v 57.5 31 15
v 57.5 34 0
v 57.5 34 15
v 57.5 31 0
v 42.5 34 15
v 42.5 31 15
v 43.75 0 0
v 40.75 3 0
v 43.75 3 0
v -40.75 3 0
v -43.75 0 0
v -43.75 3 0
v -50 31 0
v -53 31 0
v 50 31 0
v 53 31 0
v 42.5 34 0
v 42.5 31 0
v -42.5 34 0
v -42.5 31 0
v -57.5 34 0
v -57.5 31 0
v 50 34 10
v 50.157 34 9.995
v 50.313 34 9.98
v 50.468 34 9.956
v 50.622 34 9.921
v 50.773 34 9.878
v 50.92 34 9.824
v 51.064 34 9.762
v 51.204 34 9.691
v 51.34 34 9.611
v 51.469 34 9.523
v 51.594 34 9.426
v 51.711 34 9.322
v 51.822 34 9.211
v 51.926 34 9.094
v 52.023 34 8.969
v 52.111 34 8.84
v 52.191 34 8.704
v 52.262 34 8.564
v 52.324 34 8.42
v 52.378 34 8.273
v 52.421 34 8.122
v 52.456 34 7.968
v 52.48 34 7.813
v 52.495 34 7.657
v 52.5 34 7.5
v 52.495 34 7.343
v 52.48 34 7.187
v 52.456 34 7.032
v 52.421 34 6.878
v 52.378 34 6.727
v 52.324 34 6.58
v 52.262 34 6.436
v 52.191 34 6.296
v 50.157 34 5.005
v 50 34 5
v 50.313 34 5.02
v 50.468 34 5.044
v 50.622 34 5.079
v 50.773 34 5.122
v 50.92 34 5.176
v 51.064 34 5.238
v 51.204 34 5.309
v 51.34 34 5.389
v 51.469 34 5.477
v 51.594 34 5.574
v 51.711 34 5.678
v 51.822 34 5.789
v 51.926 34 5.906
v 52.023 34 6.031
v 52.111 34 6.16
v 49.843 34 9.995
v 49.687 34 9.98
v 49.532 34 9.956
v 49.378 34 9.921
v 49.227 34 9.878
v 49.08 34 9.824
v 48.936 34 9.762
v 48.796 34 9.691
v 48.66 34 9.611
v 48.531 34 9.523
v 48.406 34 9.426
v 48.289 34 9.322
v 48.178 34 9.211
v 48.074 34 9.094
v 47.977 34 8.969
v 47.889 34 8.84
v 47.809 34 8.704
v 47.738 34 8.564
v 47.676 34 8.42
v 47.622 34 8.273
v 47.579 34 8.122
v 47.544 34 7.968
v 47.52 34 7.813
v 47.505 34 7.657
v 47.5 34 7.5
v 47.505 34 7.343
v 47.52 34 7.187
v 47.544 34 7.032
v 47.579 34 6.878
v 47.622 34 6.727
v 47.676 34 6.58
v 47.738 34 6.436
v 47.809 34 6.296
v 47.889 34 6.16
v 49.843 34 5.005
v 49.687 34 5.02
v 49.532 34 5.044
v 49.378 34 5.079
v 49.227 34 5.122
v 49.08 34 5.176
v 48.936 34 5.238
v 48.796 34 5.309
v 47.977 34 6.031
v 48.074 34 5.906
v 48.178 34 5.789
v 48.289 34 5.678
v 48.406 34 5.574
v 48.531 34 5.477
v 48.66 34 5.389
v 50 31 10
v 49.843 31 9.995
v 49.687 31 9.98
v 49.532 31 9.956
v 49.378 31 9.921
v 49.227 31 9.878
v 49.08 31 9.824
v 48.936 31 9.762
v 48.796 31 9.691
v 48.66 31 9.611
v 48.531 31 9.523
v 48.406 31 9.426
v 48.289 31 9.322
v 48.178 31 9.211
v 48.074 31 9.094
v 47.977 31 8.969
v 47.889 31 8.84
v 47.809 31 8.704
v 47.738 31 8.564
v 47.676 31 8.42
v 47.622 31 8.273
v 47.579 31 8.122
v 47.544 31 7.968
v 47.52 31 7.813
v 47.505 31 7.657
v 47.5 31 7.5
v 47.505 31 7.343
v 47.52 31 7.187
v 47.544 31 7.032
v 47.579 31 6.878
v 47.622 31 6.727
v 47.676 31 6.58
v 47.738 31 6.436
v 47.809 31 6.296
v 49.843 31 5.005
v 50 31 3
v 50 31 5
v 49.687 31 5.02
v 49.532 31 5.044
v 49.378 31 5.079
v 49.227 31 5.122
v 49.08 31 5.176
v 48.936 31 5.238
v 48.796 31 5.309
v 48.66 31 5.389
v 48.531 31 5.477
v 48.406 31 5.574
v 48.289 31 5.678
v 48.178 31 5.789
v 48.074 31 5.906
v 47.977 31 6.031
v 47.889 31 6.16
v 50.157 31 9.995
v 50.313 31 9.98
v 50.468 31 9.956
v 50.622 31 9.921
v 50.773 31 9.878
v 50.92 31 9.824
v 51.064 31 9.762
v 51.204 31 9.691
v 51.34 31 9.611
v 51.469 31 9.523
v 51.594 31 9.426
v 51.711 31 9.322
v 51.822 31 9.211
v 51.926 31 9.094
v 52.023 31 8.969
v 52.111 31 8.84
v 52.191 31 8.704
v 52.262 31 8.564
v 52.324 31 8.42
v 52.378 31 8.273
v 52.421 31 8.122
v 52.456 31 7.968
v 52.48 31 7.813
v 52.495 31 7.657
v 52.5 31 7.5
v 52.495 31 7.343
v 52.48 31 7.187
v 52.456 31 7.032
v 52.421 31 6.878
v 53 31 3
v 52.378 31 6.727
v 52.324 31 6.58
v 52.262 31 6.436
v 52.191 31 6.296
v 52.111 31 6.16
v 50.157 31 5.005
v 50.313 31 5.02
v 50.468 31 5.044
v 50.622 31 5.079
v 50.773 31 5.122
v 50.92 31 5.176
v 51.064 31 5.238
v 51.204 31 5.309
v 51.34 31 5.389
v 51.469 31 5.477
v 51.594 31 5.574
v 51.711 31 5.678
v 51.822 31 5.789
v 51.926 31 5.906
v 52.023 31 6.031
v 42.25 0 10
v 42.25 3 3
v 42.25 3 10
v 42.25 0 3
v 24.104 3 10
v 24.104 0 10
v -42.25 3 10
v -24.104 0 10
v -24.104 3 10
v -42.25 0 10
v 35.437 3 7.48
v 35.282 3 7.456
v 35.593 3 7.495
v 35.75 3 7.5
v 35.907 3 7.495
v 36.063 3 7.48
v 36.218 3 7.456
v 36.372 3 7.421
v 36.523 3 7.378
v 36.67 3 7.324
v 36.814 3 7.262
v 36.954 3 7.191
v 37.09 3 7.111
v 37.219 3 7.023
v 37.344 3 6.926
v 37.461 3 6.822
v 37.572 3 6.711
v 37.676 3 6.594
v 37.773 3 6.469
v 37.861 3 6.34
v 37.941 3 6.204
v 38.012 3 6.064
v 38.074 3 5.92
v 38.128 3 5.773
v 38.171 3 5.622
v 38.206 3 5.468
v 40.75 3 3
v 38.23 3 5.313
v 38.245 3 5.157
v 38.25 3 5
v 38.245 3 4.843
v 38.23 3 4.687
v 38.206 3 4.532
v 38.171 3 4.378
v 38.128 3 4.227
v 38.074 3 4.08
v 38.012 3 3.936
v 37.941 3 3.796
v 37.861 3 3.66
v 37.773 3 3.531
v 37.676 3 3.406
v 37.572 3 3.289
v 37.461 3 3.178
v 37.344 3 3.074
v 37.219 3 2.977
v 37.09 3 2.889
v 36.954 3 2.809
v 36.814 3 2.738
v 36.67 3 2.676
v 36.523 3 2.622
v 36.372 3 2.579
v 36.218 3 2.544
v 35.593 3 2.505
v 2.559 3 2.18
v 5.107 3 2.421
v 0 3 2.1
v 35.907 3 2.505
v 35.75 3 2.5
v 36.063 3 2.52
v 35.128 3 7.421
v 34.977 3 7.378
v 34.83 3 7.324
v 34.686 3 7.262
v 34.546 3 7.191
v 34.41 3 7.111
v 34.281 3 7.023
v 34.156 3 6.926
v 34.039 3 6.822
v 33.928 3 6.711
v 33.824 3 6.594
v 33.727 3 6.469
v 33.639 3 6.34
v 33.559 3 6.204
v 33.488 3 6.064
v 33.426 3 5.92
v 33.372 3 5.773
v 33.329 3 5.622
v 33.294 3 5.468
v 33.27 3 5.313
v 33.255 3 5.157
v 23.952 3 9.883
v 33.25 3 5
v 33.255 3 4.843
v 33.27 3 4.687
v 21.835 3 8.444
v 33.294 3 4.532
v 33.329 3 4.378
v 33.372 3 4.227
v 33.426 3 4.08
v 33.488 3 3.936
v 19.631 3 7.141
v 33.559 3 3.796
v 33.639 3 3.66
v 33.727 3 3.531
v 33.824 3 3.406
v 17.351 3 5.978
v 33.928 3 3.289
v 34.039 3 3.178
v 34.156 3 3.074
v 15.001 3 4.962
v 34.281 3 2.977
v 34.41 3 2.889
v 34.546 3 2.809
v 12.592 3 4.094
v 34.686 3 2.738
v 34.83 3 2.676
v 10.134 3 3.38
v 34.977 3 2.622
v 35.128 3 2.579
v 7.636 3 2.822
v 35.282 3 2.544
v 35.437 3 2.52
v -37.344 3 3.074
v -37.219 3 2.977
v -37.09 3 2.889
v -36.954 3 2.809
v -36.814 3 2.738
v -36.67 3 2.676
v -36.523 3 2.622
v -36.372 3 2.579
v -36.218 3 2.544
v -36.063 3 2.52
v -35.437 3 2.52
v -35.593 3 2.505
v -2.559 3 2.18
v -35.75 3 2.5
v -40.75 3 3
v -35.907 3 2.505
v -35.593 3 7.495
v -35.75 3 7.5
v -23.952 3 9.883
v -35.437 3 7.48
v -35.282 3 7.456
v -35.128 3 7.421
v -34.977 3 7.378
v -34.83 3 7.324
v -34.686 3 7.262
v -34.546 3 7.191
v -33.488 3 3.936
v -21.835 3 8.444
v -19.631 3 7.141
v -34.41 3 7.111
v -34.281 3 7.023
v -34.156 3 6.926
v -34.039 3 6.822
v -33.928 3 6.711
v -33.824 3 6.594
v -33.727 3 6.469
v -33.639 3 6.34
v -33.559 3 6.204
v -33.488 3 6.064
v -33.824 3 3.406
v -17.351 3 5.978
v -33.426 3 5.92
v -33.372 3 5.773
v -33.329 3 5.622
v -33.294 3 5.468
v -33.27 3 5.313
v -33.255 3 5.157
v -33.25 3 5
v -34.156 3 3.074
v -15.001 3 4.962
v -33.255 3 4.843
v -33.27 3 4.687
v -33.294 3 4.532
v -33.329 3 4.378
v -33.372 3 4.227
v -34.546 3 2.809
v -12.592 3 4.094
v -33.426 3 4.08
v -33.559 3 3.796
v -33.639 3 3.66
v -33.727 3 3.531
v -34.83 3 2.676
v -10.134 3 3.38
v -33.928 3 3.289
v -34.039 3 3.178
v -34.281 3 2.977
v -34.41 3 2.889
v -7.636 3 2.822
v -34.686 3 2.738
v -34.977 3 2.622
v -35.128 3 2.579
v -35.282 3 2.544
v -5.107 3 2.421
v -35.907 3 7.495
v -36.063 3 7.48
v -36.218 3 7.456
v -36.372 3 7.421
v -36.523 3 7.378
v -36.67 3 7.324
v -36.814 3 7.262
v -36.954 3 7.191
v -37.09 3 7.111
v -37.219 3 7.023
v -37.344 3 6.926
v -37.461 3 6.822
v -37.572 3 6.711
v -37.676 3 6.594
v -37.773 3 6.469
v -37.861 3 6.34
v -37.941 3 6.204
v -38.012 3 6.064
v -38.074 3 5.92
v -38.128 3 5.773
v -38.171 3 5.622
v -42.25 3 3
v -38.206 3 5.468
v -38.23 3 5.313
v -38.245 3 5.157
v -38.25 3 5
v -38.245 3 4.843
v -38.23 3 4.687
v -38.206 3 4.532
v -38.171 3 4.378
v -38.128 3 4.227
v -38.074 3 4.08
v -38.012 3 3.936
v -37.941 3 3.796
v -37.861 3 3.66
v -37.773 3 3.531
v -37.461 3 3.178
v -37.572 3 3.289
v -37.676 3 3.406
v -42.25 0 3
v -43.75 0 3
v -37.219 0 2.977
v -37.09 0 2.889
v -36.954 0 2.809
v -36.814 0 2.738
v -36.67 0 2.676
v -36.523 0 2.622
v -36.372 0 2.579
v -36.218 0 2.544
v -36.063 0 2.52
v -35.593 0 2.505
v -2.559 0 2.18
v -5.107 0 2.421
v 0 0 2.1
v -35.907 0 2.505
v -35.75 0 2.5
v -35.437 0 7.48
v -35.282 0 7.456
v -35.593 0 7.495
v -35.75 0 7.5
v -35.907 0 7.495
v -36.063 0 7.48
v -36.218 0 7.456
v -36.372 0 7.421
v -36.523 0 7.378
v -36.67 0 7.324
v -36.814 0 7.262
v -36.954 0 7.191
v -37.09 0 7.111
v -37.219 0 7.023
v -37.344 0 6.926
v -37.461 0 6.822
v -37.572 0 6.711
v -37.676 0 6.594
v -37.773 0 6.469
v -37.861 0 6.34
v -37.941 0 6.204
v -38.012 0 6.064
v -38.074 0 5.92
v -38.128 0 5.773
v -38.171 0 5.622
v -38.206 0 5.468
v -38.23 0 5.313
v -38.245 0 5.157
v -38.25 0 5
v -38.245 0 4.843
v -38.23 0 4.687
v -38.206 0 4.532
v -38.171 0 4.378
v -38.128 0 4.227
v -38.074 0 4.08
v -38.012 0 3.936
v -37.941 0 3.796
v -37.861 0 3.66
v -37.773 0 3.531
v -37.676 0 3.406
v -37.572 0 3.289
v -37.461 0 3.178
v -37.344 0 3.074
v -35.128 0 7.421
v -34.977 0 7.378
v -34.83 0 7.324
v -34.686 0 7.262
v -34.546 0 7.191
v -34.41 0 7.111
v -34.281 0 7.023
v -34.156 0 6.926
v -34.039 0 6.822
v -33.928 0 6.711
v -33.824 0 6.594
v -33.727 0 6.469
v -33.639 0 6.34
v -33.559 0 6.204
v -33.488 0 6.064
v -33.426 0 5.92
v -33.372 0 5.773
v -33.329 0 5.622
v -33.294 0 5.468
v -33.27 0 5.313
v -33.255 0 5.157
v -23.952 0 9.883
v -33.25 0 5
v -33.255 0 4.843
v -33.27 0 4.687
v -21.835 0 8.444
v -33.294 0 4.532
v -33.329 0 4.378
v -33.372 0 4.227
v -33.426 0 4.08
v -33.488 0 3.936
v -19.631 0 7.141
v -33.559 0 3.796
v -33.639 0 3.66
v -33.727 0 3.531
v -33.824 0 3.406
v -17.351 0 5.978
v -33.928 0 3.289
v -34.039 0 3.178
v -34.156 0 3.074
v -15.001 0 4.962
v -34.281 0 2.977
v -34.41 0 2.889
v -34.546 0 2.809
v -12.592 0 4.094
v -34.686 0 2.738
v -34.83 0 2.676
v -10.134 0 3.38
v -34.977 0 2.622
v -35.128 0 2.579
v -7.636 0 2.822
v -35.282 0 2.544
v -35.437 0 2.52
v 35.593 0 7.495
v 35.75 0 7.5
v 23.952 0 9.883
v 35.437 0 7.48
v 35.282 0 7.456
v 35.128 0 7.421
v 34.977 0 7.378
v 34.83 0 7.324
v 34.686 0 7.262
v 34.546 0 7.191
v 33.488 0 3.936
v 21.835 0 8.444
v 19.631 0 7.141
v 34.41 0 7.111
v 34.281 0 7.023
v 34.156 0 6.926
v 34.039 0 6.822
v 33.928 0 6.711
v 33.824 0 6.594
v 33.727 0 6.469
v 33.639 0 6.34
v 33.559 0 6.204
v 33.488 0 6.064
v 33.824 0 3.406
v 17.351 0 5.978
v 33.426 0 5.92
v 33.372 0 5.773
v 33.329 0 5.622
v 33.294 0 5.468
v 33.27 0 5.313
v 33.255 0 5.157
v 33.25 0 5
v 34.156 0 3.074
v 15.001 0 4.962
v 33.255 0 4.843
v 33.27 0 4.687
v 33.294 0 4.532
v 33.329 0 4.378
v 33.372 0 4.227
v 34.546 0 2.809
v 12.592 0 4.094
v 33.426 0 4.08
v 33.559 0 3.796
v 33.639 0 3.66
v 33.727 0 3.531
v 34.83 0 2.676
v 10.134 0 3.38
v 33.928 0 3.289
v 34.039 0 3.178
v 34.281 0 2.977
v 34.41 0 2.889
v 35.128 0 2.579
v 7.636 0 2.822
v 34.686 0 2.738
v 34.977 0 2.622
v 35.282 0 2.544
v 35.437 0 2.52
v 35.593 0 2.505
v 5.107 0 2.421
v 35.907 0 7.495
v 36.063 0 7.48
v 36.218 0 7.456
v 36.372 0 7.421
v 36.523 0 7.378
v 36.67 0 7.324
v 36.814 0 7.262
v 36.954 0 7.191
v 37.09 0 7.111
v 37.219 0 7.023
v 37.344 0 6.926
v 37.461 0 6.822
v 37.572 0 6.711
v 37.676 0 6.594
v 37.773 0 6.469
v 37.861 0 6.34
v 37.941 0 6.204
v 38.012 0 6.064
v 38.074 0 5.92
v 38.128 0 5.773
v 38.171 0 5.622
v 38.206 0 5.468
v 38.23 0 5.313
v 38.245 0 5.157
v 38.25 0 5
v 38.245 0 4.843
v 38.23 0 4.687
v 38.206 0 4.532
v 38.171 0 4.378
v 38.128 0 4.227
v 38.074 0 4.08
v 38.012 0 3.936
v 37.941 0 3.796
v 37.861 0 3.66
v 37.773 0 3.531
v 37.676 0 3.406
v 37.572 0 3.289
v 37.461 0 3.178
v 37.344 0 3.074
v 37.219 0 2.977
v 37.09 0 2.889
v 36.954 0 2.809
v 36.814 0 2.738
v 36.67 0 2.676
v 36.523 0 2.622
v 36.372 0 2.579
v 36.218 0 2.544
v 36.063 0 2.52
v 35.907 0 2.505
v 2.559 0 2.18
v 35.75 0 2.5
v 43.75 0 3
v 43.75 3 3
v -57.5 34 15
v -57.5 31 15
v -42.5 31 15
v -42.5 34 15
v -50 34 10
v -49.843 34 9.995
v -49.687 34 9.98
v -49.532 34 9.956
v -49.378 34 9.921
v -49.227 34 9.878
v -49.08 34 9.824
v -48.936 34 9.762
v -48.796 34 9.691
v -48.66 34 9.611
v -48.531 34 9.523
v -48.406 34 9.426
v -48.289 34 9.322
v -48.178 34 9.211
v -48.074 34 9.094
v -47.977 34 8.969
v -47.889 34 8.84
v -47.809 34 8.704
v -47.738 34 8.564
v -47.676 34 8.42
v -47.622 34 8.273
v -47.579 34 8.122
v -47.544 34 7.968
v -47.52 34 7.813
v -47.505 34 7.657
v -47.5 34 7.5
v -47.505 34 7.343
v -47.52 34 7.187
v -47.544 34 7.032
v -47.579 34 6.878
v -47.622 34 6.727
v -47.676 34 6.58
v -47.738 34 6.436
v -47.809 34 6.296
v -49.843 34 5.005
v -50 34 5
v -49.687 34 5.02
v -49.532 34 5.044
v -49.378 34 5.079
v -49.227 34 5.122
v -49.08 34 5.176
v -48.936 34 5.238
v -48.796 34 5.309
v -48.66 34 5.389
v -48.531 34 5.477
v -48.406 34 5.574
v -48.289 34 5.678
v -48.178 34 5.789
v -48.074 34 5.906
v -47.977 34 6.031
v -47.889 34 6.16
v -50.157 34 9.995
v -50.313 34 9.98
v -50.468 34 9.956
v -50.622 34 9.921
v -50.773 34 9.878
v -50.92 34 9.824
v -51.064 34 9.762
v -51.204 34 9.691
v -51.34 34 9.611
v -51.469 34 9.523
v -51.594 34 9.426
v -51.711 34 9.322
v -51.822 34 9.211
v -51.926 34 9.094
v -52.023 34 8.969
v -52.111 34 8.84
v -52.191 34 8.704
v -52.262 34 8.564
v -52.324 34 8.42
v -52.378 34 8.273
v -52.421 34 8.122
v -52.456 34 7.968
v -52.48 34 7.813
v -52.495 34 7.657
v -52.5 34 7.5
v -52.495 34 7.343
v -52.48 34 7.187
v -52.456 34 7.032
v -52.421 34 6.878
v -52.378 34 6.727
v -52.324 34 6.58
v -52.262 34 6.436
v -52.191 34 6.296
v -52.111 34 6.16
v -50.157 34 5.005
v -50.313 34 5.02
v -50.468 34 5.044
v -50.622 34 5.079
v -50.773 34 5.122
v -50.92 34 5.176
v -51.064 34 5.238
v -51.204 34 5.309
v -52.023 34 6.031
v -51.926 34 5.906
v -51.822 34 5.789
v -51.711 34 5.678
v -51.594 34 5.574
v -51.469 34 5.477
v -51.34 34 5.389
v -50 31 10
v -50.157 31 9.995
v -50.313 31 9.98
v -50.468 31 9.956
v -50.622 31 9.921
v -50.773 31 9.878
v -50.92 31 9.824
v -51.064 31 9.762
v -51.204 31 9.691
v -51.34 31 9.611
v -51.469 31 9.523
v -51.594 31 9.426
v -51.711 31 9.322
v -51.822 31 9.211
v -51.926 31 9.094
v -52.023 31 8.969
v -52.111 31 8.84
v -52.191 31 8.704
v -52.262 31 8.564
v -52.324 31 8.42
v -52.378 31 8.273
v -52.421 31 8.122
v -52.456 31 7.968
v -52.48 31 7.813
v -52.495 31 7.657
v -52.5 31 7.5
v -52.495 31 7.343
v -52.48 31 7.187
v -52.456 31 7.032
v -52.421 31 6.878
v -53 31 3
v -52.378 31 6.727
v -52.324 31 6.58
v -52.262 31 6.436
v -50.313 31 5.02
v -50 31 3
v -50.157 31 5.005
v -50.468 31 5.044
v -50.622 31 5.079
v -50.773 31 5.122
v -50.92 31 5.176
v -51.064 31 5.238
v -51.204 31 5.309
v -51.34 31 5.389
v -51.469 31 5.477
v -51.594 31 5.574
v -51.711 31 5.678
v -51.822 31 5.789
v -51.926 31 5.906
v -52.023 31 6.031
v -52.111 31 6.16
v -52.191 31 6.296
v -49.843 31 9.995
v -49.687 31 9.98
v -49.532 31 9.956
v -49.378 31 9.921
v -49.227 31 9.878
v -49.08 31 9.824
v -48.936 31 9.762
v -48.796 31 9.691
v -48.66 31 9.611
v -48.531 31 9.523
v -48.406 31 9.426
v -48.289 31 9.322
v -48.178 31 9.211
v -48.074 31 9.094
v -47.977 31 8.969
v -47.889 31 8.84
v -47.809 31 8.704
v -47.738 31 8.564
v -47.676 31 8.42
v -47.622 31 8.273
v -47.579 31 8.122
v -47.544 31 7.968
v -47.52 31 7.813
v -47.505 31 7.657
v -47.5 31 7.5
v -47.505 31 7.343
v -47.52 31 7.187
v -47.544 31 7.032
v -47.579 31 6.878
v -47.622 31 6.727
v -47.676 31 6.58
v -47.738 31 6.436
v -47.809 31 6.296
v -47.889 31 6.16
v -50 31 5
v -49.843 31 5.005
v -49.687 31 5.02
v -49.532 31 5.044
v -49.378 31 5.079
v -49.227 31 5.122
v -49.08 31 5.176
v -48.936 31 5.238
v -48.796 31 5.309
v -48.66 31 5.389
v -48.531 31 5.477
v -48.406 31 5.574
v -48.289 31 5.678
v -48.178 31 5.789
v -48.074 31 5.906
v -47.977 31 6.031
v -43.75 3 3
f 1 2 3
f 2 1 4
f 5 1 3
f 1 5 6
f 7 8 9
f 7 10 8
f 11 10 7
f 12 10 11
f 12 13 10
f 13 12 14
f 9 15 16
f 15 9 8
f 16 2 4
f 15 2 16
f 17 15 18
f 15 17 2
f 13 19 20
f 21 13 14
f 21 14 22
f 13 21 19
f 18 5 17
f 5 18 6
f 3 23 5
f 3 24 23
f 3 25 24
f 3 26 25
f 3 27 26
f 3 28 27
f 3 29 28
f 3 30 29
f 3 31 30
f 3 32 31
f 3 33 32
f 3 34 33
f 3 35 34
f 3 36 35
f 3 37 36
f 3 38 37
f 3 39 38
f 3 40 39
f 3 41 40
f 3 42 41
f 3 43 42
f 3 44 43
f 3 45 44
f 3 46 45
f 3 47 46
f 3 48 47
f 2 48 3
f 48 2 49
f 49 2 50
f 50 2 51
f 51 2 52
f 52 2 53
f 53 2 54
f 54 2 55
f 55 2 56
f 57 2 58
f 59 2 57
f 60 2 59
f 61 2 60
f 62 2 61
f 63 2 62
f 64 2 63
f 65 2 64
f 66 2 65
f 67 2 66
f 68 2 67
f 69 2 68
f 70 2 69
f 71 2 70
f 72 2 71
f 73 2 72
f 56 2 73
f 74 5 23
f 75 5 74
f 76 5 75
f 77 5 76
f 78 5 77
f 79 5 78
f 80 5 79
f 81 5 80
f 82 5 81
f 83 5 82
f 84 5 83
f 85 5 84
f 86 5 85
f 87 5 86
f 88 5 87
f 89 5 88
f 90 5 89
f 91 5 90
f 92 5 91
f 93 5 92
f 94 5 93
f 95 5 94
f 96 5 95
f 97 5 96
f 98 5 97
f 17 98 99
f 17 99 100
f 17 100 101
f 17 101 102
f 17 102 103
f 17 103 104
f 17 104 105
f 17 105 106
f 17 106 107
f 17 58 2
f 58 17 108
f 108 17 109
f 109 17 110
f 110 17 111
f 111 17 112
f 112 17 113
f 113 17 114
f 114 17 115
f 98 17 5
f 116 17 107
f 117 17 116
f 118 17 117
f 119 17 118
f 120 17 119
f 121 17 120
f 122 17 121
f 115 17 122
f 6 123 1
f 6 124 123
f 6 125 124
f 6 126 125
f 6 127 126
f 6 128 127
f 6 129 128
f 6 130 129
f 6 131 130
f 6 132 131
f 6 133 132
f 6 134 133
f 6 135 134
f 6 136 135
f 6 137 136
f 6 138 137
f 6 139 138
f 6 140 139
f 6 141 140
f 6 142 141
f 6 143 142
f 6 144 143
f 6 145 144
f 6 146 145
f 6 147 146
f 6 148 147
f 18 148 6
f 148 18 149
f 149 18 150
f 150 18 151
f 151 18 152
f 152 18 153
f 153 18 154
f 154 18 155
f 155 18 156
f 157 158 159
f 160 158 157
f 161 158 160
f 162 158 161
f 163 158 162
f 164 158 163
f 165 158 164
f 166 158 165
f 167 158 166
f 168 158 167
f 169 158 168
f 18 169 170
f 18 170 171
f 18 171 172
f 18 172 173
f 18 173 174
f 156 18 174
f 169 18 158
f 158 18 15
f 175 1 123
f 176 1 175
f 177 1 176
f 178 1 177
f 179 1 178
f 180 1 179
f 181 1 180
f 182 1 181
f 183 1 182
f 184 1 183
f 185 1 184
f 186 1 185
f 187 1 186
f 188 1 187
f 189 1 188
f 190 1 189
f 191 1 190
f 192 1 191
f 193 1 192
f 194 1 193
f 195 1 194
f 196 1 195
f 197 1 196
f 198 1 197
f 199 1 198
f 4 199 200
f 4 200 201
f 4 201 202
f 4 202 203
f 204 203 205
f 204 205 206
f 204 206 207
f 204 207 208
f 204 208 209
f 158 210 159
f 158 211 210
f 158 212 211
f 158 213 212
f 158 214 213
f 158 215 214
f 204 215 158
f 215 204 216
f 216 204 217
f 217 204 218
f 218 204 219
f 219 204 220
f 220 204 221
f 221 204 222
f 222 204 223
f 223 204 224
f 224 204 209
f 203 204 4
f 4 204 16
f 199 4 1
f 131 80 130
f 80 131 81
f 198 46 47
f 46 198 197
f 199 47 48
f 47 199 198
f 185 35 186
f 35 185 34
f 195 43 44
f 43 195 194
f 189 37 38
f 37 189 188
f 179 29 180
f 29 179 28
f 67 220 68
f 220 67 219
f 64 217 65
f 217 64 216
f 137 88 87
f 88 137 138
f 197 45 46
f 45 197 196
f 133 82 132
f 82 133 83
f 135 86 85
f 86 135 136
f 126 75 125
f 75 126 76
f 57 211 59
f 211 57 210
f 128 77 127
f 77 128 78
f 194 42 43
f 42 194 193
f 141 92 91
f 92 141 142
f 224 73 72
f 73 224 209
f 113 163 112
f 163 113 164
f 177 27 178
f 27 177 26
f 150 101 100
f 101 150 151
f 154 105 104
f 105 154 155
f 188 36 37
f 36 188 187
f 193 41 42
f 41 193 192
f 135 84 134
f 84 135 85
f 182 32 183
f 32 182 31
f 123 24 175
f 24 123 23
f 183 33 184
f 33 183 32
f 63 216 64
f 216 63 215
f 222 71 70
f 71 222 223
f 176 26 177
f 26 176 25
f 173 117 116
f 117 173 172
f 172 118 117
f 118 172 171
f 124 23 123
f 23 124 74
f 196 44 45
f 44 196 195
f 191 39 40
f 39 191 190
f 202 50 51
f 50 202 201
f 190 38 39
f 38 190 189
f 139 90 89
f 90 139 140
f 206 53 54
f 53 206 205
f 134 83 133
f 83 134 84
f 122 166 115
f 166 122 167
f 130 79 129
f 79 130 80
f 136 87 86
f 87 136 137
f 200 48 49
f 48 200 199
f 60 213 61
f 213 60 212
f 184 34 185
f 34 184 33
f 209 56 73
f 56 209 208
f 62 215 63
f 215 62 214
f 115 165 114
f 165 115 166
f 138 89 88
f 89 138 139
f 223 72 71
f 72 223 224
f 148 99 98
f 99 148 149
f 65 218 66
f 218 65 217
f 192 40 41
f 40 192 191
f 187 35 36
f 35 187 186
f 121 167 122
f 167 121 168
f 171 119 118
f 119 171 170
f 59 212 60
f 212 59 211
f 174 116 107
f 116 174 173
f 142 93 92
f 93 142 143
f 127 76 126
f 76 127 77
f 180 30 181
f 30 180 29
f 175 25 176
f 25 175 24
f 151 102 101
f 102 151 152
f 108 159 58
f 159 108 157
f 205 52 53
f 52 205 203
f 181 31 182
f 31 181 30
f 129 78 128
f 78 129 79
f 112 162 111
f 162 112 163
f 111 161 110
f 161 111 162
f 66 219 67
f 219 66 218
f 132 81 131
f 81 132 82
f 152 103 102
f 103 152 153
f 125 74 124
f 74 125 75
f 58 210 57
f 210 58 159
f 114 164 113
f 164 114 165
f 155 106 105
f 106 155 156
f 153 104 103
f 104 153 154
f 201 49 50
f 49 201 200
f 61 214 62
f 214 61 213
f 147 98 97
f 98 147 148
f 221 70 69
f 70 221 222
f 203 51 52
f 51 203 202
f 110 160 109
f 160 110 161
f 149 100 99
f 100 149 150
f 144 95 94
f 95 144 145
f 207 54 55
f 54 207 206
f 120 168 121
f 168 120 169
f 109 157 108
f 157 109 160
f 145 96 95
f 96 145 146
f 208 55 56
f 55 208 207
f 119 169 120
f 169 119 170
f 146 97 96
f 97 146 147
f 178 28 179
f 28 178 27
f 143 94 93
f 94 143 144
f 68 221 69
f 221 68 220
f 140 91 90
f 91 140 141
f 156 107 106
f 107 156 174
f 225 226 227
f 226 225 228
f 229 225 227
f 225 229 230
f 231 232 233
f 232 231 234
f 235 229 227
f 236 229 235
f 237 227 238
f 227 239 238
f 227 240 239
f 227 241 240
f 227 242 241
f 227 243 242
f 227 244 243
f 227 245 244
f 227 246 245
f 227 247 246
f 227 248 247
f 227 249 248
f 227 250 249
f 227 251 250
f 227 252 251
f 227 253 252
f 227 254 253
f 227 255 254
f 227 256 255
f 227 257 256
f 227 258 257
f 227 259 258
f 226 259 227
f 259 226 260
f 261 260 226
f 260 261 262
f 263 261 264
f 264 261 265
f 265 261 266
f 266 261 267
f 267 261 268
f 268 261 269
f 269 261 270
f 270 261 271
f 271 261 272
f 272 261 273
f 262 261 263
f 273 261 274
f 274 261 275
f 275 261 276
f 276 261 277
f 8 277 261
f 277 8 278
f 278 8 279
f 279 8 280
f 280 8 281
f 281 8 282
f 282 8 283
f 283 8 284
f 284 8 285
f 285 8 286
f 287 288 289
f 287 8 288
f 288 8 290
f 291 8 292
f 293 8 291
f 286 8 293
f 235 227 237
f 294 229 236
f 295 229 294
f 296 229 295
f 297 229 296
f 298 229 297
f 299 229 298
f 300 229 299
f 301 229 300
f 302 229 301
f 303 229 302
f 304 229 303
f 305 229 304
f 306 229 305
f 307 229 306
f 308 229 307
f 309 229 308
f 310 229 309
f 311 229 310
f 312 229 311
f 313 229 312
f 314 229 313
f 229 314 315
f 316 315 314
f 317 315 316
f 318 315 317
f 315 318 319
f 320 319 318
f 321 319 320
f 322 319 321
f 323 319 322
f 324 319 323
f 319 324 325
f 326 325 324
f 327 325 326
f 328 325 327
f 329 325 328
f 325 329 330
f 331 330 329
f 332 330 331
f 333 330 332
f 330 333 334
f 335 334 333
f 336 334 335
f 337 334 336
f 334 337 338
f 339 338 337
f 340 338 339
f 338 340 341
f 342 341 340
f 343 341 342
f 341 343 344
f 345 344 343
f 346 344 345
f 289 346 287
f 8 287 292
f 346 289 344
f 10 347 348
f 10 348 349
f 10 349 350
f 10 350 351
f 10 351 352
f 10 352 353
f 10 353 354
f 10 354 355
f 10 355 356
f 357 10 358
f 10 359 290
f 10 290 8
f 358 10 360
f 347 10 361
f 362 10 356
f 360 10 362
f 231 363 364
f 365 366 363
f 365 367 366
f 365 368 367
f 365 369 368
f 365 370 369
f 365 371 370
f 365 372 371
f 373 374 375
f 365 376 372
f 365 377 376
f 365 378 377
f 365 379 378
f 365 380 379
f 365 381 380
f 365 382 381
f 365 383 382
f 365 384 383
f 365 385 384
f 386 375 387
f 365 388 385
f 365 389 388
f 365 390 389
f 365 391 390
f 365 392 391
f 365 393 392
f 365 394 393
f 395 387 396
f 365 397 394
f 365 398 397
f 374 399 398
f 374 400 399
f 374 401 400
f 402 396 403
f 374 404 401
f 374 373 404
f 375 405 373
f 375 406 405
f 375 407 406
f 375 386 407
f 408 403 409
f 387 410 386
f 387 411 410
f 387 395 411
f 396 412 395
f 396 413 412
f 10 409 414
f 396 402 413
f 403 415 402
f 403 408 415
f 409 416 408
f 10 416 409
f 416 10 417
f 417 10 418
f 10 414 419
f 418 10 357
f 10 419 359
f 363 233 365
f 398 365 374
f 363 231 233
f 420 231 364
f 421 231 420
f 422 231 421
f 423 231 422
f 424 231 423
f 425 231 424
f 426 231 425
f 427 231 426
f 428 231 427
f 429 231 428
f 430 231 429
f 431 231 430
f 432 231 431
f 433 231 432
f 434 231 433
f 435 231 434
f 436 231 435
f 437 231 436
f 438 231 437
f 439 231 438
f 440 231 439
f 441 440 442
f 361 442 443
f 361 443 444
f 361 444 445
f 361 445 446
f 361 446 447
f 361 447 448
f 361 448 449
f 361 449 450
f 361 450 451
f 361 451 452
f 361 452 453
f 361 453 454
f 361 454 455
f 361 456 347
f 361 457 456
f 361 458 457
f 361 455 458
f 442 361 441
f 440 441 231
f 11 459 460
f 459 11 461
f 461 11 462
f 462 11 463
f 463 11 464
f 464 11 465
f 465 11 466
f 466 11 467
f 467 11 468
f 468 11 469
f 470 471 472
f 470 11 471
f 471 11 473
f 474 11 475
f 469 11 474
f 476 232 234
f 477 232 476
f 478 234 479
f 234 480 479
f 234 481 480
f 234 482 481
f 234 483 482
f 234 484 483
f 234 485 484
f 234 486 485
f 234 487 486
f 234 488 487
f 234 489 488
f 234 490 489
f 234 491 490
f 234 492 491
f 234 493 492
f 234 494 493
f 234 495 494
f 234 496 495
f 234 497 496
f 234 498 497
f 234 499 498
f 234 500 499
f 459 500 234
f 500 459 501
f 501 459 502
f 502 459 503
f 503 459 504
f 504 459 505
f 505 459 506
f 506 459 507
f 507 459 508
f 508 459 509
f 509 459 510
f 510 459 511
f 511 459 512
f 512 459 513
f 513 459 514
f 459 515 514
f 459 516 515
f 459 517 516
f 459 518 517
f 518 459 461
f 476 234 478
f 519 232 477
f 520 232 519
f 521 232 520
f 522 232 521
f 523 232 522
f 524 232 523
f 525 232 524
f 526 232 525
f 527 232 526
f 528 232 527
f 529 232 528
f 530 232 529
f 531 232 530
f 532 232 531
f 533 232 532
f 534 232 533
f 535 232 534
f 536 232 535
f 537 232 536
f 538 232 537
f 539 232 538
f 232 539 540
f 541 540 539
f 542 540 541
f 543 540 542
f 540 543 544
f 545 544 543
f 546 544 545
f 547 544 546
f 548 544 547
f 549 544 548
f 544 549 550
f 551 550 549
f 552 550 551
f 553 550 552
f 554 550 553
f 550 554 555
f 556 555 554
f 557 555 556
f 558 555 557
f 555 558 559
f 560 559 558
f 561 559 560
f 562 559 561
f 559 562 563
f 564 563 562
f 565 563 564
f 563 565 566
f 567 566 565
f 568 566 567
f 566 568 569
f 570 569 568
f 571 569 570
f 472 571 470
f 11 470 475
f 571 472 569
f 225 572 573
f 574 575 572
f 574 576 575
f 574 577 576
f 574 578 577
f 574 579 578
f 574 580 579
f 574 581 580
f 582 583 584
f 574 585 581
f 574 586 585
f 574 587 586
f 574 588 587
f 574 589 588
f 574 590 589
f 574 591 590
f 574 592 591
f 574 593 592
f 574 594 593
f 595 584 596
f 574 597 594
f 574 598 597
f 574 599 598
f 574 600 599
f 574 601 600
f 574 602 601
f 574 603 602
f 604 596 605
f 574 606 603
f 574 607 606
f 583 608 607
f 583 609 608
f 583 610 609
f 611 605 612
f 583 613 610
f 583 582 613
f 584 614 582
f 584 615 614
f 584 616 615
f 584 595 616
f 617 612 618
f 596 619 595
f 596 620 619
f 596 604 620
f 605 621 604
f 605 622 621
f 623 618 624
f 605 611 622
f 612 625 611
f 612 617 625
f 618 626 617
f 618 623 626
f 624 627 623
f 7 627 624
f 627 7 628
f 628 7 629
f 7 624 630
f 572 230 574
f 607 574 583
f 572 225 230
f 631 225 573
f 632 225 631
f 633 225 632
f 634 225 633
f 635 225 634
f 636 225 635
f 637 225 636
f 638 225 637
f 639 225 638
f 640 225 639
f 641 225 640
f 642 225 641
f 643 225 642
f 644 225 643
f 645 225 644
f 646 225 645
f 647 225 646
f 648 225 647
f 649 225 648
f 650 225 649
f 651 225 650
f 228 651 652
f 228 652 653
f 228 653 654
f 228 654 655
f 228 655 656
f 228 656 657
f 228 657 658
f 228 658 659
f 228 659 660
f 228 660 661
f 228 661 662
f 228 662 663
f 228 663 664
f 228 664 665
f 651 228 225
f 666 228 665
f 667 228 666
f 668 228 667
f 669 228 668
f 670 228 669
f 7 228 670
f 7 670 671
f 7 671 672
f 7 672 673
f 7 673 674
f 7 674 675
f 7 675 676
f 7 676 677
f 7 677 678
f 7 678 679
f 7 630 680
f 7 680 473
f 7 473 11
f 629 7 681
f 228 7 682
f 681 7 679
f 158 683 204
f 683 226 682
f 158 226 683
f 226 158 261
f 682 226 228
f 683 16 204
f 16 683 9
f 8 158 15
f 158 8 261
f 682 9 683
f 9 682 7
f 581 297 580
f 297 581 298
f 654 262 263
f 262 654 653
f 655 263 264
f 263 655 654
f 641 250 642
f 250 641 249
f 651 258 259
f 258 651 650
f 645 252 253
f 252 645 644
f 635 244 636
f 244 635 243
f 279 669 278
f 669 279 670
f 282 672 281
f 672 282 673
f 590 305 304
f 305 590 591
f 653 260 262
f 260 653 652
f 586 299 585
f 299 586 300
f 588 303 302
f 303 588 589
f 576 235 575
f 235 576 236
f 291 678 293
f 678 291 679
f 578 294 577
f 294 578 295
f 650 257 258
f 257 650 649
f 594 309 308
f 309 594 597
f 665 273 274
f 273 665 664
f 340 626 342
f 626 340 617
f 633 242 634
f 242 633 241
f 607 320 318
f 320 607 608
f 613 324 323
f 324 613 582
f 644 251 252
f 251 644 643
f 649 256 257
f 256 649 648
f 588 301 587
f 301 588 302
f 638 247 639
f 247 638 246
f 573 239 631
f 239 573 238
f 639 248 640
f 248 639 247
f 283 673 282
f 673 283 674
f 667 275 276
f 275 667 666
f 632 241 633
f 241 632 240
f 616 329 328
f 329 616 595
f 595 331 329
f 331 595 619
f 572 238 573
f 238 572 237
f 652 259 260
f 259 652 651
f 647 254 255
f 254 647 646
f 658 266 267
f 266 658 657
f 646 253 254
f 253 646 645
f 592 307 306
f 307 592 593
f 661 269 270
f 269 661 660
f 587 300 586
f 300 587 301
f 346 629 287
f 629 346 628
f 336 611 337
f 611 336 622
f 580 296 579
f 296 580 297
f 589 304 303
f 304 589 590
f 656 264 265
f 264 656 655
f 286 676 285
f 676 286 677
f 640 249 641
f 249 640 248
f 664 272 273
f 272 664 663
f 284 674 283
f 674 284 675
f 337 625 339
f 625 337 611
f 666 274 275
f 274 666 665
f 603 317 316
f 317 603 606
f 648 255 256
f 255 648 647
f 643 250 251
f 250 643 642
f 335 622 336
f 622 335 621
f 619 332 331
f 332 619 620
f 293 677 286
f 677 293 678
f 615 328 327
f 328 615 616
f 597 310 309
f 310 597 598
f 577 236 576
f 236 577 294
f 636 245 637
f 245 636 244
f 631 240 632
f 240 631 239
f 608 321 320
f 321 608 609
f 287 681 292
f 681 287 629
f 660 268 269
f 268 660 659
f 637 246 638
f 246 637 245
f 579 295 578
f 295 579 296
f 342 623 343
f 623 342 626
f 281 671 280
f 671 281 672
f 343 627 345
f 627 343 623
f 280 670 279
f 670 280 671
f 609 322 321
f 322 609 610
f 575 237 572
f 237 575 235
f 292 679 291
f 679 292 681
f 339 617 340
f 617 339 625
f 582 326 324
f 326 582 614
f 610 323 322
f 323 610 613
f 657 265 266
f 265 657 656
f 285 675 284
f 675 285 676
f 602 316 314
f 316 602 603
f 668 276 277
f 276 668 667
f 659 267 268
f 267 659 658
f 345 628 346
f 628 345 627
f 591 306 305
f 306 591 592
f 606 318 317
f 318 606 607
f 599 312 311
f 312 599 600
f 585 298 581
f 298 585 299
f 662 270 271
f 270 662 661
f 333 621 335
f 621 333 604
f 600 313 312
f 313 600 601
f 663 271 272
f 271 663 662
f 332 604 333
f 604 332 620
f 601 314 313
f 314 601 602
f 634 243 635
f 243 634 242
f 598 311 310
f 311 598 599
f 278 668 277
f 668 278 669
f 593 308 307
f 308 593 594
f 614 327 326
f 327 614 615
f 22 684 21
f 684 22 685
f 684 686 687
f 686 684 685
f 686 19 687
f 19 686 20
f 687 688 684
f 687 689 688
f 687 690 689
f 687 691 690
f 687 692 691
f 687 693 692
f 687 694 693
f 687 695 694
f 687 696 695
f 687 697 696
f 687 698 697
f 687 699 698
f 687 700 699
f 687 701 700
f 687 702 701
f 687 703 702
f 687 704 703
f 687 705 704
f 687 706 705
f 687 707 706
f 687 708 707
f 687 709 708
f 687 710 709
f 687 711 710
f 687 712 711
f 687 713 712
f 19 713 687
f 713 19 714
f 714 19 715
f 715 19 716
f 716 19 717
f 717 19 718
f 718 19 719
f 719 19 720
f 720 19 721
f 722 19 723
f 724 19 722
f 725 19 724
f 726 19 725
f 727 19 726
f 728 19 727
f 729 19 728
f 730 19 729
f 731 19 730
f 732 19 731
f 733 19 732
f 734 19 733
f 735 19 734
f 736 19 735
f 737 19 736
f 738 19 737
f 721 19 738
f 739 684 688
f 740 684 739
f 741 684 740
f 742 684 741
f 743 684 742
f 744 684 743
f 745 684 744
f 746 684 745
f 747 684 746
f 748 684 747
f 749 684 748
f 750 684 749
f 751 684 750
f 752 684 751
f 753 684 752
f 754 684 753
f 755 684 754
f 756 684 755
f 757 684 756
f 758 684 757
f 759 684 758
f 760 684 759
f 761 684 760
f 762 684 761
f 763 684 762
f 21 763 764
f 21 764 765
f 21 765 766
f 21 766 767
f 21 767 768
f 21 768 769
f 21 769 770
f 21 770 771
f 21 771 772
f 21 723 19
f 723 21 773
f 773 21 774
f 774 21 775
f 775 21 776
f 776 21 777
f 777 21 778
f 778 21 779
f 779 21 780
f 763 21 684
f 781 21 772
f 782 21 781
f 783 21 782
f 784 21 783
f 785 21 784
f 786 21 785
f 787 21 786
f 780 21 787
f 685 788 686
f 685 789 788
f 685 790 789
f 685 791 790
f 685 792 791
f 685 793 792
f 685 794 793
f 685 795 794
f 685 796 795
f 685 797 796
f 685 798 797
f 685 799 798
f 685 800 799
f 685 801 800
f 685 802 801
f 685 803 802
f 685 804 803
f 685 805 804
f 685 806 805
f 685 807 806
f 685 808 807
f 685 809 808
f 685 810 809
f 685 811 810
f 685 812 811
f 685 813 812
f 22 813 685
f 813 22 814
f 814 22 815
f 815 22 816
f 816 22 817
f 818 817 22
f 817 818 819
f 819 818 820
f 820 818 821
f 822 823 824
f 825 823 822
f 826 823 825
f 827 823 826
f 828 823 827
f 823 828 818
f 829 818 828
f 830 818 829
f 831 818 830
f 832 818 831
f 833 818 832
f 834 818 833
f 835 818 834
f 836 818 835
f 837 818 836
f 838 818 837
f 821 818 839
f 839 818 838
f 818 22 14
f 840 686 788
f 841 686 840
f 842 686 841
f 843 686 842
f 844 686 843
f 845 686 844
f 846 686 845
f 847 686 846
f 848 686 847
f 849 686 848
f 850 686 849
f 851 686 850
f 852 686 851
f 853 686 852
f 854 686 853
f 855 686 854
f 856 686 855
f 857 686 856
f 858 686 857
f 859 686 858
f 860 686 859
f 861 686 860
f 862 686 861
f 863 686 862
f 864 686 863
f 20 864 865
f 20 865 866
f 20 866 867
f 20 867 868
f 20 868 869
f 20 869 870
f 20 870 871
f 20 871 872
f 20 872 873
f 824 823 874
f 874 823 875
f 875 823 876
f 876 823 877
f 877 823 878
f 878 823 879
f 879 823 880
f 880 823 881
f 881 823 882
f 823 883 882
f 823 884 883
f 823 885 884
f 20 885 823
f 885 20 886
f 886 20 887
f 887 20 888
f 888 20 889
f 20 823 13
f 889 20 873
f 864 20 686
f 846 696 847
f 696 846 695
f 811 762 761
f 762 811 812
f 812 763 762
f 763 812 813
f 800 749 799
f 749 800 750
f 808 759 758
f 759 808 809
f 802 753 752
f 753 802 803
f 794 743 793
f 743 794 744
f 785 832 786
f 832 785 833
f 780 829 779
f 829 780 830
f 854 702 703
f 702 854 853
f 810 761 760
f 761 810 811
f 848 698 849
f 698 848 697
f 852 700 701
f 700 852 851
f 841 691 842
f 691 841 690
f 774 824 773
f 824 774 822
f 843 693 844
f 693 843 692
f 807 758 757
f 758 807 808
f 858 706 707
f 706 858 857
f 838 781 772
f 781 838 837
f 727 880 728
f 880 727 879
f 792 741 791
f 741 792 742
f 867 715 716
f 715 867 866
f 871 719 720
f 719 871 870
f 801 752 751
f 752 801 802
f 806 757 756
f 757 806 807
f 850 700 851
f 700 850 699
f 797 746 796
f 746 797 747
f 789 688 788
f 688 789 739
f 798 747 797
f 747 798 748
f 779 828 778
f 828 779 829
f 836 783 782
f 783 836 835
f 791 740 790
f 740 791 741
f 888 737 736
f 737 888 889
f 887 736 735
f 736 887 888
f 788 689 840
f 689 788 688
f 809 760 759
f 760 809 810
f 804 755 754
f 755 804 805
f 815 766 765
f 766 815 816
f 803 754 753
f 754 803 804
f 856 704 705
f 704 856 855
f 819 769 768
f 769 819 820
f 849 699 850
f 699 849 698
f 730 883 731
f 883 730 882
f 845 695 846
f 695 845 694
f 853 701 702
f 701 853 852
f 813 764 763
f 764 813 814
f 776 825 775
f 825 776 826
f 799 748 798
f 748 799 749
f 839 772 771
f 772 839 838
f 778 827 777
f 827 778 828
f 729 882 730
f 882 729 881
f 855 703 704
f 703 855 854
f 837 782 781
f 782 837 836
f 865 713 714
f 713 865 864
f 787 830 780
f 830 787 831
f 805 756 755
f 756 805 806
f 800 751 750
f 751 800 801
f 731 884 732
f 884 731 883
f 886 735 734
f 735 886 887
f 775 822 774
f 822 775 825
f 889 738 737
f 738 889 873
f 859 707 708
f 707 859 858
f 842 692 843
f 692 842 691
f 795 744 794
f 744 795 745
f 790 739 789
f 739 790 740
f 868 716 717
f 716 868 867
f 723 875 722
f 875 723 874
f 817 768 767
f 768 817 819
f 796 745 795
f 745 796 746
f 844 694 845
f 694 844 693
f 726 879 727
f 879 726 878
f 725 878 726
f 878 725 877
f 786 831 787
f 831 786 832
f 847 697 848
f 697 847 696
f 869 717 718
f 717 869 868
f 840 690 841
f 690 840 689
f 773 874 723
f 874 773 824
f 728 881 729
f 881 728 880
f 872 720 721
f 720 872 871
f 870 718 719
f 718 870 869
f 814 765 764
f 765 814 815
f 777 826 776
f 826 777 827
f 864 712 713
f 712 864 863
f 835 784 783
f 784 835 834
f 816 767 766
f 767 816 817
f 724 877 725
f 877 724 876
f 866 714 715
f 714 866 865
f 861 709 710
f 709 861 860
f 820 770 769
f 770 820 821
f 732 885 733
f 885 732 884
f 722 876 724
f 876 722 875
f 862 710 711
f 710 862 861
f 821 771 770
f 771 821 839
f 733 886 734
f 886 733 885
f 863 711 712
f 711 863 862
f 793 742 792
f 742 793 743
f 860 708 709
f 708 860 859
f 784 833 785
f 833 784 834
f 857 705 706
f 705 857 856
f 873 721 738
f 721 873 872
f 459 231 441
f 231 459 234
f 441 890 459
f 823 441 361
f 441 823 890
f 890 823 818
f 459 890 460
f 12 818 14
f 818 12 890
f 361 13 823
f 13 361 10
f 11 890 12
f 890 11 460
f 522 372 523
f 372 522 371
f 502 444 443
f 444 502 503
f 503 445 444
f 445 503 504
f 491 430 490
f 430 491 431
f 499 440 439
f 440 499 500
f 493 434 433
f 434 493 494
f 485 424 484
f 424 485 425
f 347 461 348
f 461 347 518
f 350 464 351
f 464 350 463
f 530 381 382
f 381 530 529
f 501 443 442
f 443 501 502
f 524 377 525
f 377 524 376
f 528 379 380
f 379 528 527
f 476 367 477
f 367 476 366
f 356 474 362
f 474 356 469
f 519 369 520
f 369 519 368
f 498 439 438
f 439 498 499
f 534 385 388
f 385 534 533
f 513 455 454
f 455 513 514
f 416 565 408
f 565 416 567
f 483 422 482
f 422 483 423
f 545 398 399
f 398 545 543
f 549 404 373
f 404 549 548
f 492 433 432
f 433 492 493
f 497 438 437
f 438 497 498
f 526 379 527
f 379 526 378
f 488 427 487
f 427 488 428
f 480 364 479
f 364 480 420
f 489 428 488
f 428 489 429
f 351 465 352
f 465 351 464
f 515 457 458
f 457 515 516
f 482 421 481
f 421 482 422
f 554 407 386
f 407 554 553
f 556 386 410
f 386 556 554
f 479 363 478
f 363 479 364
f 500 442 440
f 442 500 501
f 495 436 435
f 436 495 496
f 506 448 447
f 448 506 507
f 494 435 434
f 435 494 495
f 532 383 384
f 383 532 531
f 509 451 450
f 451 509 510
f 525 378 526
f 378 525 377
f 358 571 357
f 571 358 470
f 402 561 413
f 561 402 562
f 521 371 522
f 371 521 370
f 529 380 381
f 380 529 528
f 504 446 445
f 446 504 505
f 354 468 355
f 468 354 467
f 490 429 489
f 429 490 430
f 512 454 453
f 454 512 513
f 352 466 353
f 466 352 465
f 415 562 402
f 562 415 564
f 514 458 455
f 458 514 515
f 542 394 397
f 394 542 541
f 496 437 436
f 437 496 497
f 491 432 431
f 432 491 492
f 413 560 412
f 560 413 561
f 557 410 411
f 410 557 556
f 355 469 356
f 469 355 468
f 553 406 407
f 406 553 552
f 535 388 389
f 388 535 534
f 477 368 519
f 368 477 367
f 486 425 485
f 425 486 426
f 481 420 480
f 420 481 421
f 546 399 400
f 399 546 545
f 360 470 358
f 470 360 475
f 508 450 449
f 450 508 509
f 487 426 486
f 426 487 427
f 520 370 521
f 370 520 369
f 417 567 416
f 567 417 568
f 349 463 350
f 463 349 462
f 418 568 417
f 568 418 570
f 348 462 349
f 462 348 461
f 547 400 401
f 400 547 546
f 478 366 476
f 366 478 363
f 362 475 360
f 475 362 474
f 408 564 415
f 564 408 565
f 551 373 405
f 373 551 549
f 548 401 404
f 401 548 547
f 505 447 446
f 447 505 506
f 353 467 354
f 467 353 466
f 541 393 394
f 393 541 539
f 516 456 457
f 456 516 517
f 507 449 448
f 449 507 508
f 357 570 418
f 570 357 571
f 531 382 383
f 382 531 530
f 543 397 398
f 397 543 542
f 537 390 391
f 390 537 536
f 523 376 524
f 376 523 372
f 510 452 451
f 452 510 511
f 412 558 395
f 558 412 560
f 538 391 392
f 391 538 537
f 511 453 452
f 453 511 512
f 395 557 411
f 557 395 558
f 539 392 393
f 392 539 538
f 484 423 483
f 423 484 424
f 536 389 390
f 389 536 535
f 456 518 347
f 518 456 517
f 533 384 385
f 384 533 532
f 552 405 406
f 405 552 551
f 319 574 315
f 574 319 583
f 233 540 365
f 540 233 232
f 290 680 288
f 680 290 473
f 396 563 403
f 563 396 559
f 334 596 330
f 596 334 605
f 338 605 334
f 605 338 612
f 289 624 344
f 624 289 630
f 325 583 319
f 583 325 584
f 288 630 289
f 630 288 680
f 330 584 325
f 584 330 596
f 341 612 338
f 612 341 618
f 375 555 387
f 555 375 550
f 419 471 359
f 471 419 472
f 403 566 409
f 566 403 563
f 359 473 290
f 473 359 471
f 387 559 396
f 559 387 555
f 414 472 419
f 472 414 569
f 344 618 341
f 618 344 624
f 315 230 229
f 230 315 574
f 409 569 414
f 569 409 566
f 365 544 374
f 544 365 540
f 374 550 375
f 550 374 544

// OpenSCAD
// [FL_INDEX: keywords="openscad, 3d_parametric, Customizable_Fan_Riser, csg_solid" | COT="Parametric OpenSCAD design from 3DCodeverse"]
// Title: Customizable Fan Riser

// Thickness of part surfaces.
thickness = 3;
// Distance in mm that fan will be raised by. Any distance in mm greater than 2 x thickness.
height = 34;
// Center-to-center distance in mm between fan mounting holes, used for sizing the fan mount plate. i.e. an 80mm fan should be set to 71.5mm
fan_mounting_hole_seperation = 71.5;
// Center-to-center distance in mm between chassis mounting holes, used for positioning the mounting feet.
mount_hole_seperation = 100;
// Chassis mount screw hole diameter in mm.
mount_screw_hole_diameter = 5;
// Fan mount screw hole diameter in mm.
fan_screw_hole_diameter = 5;

module fan_stand(thickness, height, fan_hole_sep, mount_hole_sep)
{
	// Calculate sizes of parts (some calculations are done below).
	fan_dia = fan_mounting_hole_seperation + 2*fan_screw_hole_diameter;
	strut_tilt = (mount_hole_sep - fan_dia) / 2;
	// These two are overridden below because OpenSCAD can't assign
	// values inside conditionals.
	mount_width = 2 * fan_screw_hole_diameter;
	foot_width = 3 * thickness;

	// Mounting strut
	module mounting_strut() {
		tilt = strut_tilt;
		x1 = fan_dia/2;           //   p5 -- p4
		x2 = x1+thickness;        //  /     /
		x3 = x1+tilt+thickness;   // p6    p3
		x4 = x1+tilt;             // |     |
		z = height - thickness;   // p1 -- p2

		linear_extrude(height=thickness) {
			// Trapazoidal polygon.
			polygon(points=[[x1, 0], [x2, 0], [x2, thickness],
							[x3, z], [x4, z], [x1, thickness]]);
		}
	}

	module foot(size) {
		// Mounting foot
		footX = size;
		footY = thickness;
		footZ = footX;
		x = fan_dia/2 + strut_tilt - size/2;
	
		difference() {
			translate([x, height - thickness, 0])
				cube([footX, footY, footZ]);

			// Cut chassis mount screw hole
			translate([mount_hole_sep/2, height +1, size/2]) 
			rotate([90,0,0])
				cylinder(h=thickness+2, r=mount_screw_hole_diameter/2, center = false, $fn=100);
		}
	}

	module half_of_mount() {
		difference() {	
			// Create half
			union() {
				// Fan mount (conditional accounts for small screw hole).
				if (mount_width < thickness) {
					cube([fan_dia/2+thickness/2,thickness,thickness*3]);
				} else {
					cube([fan_dia/2+thickness/2,thickness,mount_width]);
				}

				// The strut.
				mounting_strut();
	
				// Mounting feet  (conditional accounts for small screw hole).
				if (mount_screw_hole_diameter < thickness) {
					foot(thickness * 3);
				} else {
					foot(mount_screw_hole_diameter * 3);
				}
			}
			// Cut fan mount screw hole
			translate([fan_hole_sep/2, thickness+1, mount_width/2]) 
			rotate([90,0,0])
			cylinder(h=thickness+2, r=fan_screw_hole_diameter/2, center = false, $fn=100);
		}
	}

	// Create and join both halves.
	module complete_mount() {
		union() {
			// First half
			half_of_mount();

			// Second half
			mirror([1, 0, 0])
			half_of_mount();
		}
	}

	// Create mount and cut out the air hole.
	difference() {
		complete_mount();

		// Air cutout
		translate([0, thickness*1.5, fan_dia/2 + thickness*0.7]) rotate([90,0,0])
		cylinder(h=thickness*3, r=fan_dia/2, center = false, $fn=100);
	}
}

fan_stand(thickness, height, fan_mounting_hole_seperation, mount_hole_seperation);
